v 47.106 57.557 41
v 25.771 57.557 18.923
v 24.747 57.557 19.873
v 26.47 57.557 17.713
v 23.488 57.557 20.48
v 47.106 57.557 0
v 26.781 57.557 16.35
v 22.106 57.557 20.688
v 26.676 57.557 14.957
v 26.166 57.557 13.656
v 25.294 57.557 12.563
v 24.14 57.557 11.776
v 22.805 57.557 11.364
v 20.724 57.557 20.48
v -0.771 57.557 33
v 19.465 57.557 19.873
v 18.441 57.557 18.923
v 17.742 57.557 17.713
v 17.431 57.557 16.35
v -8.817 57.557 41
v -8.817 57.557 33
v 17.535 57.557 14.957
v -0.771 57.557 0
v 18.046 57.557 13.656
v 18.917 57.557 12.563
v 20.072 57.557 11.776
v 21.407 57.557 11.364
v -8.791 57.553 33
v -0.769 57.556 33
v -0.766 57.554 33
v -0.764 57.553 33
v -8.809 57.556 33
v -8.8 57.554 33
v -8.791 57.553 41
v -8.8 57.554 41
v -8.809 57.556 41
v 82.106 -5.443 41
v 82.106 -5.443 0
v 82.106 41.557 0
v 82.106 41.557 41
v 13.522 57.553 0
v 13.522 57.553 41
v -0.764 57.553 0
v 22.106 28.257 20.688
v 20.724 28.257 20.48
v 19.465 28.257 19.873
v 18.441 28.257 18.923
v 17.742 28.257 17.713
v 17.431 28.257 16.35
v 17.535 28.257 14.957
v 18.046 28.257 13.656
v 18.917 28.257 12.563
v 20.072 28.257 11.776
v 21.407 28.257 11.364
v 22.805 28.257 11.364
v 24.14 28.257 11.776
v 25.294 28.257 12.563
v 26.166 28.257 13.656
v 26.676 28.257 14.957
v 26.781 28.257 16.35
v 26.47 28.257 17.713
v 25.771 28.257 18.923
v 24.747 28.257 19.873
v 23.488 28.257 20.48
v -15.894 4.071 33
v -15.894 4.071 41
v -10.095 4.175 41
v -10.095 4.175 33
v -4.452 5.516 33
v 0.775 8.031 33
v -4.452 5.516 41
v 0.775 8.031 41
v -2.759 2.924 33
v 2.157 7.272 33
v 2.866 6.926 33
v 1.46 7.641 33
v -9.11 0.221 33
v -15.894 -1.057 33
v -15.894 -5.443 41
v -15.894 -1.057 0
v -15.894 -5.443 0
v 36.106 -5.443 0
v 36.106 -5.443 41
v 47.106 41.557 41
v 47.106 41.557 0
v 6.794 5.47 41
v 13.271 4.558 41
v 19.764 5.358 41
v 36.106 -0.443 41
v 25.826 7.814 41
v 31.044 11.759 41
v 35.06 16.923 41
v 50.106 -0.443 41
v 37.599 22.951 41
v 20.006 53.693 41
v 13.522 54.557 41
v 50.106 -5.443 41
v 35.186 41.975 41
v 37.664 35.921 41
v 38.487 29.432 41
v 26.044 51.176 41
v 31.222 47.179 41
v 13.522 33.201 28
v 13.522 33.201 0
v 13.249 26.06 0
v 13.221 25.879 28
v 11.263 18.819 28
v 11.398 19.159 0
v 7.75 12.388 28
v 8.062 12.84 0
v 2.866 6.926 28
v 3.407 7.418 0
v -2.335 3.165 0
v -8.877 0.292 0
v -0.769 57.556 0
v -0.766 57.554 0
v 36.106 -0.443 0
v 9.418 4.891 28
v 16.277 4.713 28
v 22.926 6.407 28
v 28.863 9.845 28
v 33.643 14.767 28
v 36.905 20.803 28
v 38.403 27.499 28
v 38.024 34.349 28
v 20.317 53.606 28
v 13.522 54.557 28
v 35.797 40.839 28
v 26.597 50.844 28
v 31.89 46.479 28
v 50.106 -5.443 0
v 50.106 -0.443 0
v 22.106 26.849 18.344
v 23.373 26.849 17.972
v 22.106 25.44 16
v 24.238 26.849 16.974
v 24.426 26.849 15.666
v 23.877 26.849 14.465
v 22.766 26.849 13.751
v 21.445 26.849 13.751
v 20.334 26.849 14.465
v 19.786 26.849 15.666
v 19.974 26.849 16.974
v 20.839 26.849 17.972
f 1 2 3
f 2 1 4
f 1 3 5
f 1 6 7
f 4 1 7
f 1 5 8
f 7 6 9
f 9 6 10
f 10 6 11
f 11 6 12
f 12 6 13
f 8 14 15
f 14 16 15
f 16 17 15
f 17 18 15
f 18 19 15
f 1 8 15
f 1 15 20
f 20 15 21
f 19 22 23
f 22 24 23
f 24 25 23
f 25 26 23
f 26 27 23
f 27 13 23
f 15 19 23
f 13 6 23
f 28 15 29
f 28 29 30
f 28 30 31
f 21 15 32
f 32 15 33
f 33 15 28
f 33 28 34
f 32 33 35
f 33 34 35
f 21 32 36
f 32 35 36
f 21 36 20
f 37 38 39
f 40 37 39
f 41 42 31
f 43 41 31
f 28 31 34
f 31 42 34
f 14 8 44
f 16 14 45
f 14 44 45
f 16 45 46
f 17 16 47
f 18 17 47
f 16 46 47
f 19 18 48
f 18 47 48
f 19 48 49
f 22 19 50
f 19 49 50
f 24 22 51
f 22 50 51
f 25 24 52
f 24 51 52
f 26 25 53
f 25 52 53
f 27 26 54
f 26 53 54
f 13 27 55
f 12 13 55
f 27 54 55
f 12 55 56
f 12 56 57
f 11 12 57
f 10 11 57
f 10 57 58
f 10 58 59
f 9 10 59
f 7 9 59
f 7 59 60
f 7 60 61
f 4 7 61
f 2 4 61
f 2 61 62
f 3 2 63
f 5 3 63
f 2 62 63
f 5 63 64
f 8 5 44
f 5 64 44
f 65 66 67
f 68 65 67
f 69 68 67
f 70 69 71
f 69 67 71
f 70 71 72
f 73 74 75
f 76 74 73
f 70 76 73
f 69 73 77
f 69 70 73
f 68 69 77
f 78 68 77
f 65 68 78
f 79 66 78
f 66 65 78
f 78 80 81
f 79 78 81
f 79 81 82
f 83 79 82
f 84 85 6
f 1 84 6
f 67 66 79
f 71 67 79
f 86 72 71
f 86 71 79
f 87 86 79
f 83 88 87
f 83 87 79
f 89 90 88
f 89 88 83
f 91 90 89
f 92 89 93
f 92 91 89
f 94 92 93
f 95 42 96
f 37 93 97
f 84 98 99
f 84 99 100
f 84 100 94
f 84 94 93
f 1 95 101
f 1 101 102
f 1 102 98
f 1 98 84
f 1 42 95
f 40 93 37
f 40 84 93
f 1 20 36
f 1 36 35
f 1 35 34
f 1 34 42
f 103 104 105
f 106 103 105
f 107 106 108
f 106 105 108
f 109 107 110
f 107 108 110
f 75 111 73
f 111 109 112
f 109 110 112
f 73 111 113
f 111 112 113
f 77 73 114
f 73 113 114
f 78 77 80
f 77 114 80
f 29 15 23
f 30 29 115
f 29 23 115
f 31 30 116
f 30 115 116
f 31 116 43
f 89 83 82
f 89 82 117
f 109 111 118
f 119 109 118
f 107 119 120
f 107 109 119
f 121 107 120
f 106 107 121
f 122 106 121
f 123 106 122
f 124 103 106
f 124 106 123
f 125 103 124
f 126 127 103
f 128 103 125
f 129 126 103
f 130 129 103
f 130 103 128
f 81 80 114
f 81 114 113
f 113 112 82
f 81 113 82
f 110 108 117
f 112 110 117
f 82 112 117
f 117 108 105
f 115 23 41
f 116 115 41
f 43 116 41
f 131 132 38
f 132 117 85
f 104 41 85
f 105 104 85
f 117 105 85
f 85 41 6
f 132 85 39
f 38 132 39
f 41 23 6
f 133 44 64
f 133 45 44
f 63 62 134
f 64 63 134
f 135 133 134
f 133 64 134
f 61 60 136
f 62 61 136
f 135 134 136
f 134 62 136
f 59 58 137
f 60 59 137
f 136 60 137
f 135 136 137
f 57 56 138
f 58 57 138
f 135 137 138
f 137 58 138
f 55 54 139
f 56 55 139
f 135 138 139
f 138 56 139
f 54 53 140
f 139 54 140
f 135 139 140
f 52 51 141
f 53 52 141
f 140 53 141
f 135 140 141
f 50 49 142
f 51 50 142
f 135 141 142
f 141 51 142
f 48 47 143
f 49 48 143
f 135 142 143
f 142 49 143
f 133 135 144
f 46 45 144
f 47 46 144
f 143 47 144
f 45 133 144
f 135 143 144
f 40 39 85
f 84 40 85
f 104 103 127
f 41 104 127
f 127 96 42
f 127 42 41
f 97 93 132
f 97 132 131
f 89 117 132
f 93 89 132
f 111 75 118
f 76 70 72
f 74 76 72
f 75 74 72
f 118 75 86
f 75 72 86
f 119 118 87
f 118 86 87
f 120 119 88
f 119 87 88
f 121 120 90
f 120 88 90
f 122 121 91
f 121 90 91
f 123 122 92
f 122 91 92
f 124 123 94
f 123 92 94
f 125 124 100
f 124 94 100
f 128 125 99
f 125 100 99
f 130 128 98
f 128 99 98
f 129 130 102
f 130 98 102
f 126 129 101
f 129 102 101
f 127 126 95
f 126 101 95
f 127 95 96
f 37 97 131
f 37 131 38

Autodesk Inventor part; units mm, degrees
ref_plane "YZ Plane" through (0, 0, 0) normal (1, 0, 0) x (0, 1, 0)
ref_plane "XZ Plane" through (0, 0, 0) normal (0, 1, 0) x (-1, 0, 0)
ref_plane "XY Plane" through (0, 0, 0) normal (0, 0, 1) x (1, 0, 0)
sketch "Sketch1" plane through (0, 0, 0) normal (0, 0, 1) x (1, 0, 0)
  line L0 (-15.8942, -5.4427) -> (36.1058, -5.4427)
  line L1 (36.1058, -5.4427) -> (36.1058, -0.4427)
  line L2 (36.1058, -0.4427) -> (50.1058, -0.4427)
  line L3 (50.1058, -0.4427) -> (50.1058, -5.4427)
  line L4 (50.1058, -5.4427) -> (82.1058, -5.4427)
  line L5 (82.1058, -5.4427) -> (82.1058, 41.5573)
  line L6 (82.1058, 41.5573) -> (47.1058, 41.5573)
  line L7 (47.1058, 41.5573) -> (47.1058, 57.5573)
  line L8 (47.1058, 57.5573) -> (13.1058, 57.5573)
  line L9 (13.1058, 57.5573) -> (-15.8942, 57.5573)
  line L10 (-15.8942, 57.5573) -> (-15.8942, -5.4427)
  point P0 (0, 0)
  dimension "d0" = 52
  dimension "d1" = 5
  dimension "d2" = 14
  dimension "d3" = 5
  dimension "d4" = 32
  dimension "d5" = 47
  dimension "d6" = 35
  dimension "d7" = 16
  dimension "d8" = 34
  dimension "d9" = 29
extrude "Extrusion1" add sketch "Sketch1" along normal blind 41
sketch "Sketch10" plane through (0, 0, 41) normal (0, 0, 1) x (1, 0, 0)
  line L0 (-15.8942, 57.5573) -> (-15.8942, -5.4427) projected
  line L1 (47.1058, 57.5573) -> (-15.8942, 57.5573) projected
  point P0 (0, 0)
  point P1 (13.569, 57.5573)
  dimension "d16" = 29.4632
sketch "Sketch12" plane through (0, 0, 41) normal (0, 0, 1) x (1, 0, 0)
  circle A0 centre (-80.4891, 35.6187) radius 25
  line L0 (47.1058, 57.5573) -> (-15.8942, 57.5573) projected
  circle A1 centre (13.4877, 29.5573) radius 25
  point P0 (0, 0)
  dimension "d17" = 50
  dimension "d18" = 50
  dimension "d19" = 28
extrude "Extrusion2" cut sketch "Sketch12" against normal blind 13 contours A1
sketch "Sketch13" plane through (0, 0, 41) normal (0, 0, 1) x (1, 0, 0)
  circle A0 centre (-18.8292, 31.3442) radius 32
  circle A1 centre (13.4877, 29.5573) radius 25 projected
  line L0 (13.4877, 54.5573) -> (13.4877, 4.5573)
  circle A2 centre (-13.4781, 30.9626) radius 27
  point P0 (0, 0)
  dimension "d22" = 64
  dimension "d23" = 54
extrude "Extrusion3" cut sketch "Sketch13" against normal through all contours A0 A2 A1 | A0 A2 L0 | A2 L0 | A1 A2 picked at (-3.1402, 31.014)
sketch "Sketch14" plane through (0, 0, 41) normal (0, 0, 1) x (1, 0, 0)
  arc A0 (0.7748, 8.031) -> (3.0811, 52.2884) centre (-13.4781, 30.9626) ccw projected
  line L0 (13.5219, 30.9626) -> (13.5219, 57.5526)
  line L1 (13.5219, 57.5526) -> (-18.1655, 57.5526)
  line L2 (-18.1655, 57.5526) -> (13.5219, 30.9626)
  point P0 (0, 0)
  dimension "d26" = 41.3657
  dimension "d27" = 31.6874
extrude "Extrusion4" cut sketch "Sketch14" against normal through all
sketch "Sketch15" plane through (0, 0, 41) normal (0, 0, 1) x (1, 0, 0)
  point P0 (0, 0)
sketch "Sketch16" plane through (0, 0, 0) normal (0, 0, -1) x (-1, 0, 0)
  circle A0 centre (18.3913, 30.8453) radius 32
  point P0 (0, 0)
  dimension "d30" = 64
extrude "Extrusion5" cut sketch "Sketch16" against normal blind 33
sketch "Sketch21" plane through (47.1058, 57.5573, 41) normal (0, 1, 0) x (1, 0, 0)
  line L0 (0, 41) -> (-47.877, 41) projected
  line L1 (-63, 8) -> (-63, 41) projected
  point P0 (-47.1058, 41)
  point P1 (-25, 25)
  dimension "d33" = 16
  dimension "d34" = 38
hole "Hole1" at (22.1058, 57.5573, 16) direction (0, -1, 0) diameter 9.376 depth 29.3 tip angle 118 thread size "M11x1.5" class "6H" standard "ANSI Metric M Profile"
sketch "Sketch22" plane through (47.1058, 57.5573, 41) normal (0, 1, 0) x (1, 0, 0)
  point P0 (-47.1058, 41)
